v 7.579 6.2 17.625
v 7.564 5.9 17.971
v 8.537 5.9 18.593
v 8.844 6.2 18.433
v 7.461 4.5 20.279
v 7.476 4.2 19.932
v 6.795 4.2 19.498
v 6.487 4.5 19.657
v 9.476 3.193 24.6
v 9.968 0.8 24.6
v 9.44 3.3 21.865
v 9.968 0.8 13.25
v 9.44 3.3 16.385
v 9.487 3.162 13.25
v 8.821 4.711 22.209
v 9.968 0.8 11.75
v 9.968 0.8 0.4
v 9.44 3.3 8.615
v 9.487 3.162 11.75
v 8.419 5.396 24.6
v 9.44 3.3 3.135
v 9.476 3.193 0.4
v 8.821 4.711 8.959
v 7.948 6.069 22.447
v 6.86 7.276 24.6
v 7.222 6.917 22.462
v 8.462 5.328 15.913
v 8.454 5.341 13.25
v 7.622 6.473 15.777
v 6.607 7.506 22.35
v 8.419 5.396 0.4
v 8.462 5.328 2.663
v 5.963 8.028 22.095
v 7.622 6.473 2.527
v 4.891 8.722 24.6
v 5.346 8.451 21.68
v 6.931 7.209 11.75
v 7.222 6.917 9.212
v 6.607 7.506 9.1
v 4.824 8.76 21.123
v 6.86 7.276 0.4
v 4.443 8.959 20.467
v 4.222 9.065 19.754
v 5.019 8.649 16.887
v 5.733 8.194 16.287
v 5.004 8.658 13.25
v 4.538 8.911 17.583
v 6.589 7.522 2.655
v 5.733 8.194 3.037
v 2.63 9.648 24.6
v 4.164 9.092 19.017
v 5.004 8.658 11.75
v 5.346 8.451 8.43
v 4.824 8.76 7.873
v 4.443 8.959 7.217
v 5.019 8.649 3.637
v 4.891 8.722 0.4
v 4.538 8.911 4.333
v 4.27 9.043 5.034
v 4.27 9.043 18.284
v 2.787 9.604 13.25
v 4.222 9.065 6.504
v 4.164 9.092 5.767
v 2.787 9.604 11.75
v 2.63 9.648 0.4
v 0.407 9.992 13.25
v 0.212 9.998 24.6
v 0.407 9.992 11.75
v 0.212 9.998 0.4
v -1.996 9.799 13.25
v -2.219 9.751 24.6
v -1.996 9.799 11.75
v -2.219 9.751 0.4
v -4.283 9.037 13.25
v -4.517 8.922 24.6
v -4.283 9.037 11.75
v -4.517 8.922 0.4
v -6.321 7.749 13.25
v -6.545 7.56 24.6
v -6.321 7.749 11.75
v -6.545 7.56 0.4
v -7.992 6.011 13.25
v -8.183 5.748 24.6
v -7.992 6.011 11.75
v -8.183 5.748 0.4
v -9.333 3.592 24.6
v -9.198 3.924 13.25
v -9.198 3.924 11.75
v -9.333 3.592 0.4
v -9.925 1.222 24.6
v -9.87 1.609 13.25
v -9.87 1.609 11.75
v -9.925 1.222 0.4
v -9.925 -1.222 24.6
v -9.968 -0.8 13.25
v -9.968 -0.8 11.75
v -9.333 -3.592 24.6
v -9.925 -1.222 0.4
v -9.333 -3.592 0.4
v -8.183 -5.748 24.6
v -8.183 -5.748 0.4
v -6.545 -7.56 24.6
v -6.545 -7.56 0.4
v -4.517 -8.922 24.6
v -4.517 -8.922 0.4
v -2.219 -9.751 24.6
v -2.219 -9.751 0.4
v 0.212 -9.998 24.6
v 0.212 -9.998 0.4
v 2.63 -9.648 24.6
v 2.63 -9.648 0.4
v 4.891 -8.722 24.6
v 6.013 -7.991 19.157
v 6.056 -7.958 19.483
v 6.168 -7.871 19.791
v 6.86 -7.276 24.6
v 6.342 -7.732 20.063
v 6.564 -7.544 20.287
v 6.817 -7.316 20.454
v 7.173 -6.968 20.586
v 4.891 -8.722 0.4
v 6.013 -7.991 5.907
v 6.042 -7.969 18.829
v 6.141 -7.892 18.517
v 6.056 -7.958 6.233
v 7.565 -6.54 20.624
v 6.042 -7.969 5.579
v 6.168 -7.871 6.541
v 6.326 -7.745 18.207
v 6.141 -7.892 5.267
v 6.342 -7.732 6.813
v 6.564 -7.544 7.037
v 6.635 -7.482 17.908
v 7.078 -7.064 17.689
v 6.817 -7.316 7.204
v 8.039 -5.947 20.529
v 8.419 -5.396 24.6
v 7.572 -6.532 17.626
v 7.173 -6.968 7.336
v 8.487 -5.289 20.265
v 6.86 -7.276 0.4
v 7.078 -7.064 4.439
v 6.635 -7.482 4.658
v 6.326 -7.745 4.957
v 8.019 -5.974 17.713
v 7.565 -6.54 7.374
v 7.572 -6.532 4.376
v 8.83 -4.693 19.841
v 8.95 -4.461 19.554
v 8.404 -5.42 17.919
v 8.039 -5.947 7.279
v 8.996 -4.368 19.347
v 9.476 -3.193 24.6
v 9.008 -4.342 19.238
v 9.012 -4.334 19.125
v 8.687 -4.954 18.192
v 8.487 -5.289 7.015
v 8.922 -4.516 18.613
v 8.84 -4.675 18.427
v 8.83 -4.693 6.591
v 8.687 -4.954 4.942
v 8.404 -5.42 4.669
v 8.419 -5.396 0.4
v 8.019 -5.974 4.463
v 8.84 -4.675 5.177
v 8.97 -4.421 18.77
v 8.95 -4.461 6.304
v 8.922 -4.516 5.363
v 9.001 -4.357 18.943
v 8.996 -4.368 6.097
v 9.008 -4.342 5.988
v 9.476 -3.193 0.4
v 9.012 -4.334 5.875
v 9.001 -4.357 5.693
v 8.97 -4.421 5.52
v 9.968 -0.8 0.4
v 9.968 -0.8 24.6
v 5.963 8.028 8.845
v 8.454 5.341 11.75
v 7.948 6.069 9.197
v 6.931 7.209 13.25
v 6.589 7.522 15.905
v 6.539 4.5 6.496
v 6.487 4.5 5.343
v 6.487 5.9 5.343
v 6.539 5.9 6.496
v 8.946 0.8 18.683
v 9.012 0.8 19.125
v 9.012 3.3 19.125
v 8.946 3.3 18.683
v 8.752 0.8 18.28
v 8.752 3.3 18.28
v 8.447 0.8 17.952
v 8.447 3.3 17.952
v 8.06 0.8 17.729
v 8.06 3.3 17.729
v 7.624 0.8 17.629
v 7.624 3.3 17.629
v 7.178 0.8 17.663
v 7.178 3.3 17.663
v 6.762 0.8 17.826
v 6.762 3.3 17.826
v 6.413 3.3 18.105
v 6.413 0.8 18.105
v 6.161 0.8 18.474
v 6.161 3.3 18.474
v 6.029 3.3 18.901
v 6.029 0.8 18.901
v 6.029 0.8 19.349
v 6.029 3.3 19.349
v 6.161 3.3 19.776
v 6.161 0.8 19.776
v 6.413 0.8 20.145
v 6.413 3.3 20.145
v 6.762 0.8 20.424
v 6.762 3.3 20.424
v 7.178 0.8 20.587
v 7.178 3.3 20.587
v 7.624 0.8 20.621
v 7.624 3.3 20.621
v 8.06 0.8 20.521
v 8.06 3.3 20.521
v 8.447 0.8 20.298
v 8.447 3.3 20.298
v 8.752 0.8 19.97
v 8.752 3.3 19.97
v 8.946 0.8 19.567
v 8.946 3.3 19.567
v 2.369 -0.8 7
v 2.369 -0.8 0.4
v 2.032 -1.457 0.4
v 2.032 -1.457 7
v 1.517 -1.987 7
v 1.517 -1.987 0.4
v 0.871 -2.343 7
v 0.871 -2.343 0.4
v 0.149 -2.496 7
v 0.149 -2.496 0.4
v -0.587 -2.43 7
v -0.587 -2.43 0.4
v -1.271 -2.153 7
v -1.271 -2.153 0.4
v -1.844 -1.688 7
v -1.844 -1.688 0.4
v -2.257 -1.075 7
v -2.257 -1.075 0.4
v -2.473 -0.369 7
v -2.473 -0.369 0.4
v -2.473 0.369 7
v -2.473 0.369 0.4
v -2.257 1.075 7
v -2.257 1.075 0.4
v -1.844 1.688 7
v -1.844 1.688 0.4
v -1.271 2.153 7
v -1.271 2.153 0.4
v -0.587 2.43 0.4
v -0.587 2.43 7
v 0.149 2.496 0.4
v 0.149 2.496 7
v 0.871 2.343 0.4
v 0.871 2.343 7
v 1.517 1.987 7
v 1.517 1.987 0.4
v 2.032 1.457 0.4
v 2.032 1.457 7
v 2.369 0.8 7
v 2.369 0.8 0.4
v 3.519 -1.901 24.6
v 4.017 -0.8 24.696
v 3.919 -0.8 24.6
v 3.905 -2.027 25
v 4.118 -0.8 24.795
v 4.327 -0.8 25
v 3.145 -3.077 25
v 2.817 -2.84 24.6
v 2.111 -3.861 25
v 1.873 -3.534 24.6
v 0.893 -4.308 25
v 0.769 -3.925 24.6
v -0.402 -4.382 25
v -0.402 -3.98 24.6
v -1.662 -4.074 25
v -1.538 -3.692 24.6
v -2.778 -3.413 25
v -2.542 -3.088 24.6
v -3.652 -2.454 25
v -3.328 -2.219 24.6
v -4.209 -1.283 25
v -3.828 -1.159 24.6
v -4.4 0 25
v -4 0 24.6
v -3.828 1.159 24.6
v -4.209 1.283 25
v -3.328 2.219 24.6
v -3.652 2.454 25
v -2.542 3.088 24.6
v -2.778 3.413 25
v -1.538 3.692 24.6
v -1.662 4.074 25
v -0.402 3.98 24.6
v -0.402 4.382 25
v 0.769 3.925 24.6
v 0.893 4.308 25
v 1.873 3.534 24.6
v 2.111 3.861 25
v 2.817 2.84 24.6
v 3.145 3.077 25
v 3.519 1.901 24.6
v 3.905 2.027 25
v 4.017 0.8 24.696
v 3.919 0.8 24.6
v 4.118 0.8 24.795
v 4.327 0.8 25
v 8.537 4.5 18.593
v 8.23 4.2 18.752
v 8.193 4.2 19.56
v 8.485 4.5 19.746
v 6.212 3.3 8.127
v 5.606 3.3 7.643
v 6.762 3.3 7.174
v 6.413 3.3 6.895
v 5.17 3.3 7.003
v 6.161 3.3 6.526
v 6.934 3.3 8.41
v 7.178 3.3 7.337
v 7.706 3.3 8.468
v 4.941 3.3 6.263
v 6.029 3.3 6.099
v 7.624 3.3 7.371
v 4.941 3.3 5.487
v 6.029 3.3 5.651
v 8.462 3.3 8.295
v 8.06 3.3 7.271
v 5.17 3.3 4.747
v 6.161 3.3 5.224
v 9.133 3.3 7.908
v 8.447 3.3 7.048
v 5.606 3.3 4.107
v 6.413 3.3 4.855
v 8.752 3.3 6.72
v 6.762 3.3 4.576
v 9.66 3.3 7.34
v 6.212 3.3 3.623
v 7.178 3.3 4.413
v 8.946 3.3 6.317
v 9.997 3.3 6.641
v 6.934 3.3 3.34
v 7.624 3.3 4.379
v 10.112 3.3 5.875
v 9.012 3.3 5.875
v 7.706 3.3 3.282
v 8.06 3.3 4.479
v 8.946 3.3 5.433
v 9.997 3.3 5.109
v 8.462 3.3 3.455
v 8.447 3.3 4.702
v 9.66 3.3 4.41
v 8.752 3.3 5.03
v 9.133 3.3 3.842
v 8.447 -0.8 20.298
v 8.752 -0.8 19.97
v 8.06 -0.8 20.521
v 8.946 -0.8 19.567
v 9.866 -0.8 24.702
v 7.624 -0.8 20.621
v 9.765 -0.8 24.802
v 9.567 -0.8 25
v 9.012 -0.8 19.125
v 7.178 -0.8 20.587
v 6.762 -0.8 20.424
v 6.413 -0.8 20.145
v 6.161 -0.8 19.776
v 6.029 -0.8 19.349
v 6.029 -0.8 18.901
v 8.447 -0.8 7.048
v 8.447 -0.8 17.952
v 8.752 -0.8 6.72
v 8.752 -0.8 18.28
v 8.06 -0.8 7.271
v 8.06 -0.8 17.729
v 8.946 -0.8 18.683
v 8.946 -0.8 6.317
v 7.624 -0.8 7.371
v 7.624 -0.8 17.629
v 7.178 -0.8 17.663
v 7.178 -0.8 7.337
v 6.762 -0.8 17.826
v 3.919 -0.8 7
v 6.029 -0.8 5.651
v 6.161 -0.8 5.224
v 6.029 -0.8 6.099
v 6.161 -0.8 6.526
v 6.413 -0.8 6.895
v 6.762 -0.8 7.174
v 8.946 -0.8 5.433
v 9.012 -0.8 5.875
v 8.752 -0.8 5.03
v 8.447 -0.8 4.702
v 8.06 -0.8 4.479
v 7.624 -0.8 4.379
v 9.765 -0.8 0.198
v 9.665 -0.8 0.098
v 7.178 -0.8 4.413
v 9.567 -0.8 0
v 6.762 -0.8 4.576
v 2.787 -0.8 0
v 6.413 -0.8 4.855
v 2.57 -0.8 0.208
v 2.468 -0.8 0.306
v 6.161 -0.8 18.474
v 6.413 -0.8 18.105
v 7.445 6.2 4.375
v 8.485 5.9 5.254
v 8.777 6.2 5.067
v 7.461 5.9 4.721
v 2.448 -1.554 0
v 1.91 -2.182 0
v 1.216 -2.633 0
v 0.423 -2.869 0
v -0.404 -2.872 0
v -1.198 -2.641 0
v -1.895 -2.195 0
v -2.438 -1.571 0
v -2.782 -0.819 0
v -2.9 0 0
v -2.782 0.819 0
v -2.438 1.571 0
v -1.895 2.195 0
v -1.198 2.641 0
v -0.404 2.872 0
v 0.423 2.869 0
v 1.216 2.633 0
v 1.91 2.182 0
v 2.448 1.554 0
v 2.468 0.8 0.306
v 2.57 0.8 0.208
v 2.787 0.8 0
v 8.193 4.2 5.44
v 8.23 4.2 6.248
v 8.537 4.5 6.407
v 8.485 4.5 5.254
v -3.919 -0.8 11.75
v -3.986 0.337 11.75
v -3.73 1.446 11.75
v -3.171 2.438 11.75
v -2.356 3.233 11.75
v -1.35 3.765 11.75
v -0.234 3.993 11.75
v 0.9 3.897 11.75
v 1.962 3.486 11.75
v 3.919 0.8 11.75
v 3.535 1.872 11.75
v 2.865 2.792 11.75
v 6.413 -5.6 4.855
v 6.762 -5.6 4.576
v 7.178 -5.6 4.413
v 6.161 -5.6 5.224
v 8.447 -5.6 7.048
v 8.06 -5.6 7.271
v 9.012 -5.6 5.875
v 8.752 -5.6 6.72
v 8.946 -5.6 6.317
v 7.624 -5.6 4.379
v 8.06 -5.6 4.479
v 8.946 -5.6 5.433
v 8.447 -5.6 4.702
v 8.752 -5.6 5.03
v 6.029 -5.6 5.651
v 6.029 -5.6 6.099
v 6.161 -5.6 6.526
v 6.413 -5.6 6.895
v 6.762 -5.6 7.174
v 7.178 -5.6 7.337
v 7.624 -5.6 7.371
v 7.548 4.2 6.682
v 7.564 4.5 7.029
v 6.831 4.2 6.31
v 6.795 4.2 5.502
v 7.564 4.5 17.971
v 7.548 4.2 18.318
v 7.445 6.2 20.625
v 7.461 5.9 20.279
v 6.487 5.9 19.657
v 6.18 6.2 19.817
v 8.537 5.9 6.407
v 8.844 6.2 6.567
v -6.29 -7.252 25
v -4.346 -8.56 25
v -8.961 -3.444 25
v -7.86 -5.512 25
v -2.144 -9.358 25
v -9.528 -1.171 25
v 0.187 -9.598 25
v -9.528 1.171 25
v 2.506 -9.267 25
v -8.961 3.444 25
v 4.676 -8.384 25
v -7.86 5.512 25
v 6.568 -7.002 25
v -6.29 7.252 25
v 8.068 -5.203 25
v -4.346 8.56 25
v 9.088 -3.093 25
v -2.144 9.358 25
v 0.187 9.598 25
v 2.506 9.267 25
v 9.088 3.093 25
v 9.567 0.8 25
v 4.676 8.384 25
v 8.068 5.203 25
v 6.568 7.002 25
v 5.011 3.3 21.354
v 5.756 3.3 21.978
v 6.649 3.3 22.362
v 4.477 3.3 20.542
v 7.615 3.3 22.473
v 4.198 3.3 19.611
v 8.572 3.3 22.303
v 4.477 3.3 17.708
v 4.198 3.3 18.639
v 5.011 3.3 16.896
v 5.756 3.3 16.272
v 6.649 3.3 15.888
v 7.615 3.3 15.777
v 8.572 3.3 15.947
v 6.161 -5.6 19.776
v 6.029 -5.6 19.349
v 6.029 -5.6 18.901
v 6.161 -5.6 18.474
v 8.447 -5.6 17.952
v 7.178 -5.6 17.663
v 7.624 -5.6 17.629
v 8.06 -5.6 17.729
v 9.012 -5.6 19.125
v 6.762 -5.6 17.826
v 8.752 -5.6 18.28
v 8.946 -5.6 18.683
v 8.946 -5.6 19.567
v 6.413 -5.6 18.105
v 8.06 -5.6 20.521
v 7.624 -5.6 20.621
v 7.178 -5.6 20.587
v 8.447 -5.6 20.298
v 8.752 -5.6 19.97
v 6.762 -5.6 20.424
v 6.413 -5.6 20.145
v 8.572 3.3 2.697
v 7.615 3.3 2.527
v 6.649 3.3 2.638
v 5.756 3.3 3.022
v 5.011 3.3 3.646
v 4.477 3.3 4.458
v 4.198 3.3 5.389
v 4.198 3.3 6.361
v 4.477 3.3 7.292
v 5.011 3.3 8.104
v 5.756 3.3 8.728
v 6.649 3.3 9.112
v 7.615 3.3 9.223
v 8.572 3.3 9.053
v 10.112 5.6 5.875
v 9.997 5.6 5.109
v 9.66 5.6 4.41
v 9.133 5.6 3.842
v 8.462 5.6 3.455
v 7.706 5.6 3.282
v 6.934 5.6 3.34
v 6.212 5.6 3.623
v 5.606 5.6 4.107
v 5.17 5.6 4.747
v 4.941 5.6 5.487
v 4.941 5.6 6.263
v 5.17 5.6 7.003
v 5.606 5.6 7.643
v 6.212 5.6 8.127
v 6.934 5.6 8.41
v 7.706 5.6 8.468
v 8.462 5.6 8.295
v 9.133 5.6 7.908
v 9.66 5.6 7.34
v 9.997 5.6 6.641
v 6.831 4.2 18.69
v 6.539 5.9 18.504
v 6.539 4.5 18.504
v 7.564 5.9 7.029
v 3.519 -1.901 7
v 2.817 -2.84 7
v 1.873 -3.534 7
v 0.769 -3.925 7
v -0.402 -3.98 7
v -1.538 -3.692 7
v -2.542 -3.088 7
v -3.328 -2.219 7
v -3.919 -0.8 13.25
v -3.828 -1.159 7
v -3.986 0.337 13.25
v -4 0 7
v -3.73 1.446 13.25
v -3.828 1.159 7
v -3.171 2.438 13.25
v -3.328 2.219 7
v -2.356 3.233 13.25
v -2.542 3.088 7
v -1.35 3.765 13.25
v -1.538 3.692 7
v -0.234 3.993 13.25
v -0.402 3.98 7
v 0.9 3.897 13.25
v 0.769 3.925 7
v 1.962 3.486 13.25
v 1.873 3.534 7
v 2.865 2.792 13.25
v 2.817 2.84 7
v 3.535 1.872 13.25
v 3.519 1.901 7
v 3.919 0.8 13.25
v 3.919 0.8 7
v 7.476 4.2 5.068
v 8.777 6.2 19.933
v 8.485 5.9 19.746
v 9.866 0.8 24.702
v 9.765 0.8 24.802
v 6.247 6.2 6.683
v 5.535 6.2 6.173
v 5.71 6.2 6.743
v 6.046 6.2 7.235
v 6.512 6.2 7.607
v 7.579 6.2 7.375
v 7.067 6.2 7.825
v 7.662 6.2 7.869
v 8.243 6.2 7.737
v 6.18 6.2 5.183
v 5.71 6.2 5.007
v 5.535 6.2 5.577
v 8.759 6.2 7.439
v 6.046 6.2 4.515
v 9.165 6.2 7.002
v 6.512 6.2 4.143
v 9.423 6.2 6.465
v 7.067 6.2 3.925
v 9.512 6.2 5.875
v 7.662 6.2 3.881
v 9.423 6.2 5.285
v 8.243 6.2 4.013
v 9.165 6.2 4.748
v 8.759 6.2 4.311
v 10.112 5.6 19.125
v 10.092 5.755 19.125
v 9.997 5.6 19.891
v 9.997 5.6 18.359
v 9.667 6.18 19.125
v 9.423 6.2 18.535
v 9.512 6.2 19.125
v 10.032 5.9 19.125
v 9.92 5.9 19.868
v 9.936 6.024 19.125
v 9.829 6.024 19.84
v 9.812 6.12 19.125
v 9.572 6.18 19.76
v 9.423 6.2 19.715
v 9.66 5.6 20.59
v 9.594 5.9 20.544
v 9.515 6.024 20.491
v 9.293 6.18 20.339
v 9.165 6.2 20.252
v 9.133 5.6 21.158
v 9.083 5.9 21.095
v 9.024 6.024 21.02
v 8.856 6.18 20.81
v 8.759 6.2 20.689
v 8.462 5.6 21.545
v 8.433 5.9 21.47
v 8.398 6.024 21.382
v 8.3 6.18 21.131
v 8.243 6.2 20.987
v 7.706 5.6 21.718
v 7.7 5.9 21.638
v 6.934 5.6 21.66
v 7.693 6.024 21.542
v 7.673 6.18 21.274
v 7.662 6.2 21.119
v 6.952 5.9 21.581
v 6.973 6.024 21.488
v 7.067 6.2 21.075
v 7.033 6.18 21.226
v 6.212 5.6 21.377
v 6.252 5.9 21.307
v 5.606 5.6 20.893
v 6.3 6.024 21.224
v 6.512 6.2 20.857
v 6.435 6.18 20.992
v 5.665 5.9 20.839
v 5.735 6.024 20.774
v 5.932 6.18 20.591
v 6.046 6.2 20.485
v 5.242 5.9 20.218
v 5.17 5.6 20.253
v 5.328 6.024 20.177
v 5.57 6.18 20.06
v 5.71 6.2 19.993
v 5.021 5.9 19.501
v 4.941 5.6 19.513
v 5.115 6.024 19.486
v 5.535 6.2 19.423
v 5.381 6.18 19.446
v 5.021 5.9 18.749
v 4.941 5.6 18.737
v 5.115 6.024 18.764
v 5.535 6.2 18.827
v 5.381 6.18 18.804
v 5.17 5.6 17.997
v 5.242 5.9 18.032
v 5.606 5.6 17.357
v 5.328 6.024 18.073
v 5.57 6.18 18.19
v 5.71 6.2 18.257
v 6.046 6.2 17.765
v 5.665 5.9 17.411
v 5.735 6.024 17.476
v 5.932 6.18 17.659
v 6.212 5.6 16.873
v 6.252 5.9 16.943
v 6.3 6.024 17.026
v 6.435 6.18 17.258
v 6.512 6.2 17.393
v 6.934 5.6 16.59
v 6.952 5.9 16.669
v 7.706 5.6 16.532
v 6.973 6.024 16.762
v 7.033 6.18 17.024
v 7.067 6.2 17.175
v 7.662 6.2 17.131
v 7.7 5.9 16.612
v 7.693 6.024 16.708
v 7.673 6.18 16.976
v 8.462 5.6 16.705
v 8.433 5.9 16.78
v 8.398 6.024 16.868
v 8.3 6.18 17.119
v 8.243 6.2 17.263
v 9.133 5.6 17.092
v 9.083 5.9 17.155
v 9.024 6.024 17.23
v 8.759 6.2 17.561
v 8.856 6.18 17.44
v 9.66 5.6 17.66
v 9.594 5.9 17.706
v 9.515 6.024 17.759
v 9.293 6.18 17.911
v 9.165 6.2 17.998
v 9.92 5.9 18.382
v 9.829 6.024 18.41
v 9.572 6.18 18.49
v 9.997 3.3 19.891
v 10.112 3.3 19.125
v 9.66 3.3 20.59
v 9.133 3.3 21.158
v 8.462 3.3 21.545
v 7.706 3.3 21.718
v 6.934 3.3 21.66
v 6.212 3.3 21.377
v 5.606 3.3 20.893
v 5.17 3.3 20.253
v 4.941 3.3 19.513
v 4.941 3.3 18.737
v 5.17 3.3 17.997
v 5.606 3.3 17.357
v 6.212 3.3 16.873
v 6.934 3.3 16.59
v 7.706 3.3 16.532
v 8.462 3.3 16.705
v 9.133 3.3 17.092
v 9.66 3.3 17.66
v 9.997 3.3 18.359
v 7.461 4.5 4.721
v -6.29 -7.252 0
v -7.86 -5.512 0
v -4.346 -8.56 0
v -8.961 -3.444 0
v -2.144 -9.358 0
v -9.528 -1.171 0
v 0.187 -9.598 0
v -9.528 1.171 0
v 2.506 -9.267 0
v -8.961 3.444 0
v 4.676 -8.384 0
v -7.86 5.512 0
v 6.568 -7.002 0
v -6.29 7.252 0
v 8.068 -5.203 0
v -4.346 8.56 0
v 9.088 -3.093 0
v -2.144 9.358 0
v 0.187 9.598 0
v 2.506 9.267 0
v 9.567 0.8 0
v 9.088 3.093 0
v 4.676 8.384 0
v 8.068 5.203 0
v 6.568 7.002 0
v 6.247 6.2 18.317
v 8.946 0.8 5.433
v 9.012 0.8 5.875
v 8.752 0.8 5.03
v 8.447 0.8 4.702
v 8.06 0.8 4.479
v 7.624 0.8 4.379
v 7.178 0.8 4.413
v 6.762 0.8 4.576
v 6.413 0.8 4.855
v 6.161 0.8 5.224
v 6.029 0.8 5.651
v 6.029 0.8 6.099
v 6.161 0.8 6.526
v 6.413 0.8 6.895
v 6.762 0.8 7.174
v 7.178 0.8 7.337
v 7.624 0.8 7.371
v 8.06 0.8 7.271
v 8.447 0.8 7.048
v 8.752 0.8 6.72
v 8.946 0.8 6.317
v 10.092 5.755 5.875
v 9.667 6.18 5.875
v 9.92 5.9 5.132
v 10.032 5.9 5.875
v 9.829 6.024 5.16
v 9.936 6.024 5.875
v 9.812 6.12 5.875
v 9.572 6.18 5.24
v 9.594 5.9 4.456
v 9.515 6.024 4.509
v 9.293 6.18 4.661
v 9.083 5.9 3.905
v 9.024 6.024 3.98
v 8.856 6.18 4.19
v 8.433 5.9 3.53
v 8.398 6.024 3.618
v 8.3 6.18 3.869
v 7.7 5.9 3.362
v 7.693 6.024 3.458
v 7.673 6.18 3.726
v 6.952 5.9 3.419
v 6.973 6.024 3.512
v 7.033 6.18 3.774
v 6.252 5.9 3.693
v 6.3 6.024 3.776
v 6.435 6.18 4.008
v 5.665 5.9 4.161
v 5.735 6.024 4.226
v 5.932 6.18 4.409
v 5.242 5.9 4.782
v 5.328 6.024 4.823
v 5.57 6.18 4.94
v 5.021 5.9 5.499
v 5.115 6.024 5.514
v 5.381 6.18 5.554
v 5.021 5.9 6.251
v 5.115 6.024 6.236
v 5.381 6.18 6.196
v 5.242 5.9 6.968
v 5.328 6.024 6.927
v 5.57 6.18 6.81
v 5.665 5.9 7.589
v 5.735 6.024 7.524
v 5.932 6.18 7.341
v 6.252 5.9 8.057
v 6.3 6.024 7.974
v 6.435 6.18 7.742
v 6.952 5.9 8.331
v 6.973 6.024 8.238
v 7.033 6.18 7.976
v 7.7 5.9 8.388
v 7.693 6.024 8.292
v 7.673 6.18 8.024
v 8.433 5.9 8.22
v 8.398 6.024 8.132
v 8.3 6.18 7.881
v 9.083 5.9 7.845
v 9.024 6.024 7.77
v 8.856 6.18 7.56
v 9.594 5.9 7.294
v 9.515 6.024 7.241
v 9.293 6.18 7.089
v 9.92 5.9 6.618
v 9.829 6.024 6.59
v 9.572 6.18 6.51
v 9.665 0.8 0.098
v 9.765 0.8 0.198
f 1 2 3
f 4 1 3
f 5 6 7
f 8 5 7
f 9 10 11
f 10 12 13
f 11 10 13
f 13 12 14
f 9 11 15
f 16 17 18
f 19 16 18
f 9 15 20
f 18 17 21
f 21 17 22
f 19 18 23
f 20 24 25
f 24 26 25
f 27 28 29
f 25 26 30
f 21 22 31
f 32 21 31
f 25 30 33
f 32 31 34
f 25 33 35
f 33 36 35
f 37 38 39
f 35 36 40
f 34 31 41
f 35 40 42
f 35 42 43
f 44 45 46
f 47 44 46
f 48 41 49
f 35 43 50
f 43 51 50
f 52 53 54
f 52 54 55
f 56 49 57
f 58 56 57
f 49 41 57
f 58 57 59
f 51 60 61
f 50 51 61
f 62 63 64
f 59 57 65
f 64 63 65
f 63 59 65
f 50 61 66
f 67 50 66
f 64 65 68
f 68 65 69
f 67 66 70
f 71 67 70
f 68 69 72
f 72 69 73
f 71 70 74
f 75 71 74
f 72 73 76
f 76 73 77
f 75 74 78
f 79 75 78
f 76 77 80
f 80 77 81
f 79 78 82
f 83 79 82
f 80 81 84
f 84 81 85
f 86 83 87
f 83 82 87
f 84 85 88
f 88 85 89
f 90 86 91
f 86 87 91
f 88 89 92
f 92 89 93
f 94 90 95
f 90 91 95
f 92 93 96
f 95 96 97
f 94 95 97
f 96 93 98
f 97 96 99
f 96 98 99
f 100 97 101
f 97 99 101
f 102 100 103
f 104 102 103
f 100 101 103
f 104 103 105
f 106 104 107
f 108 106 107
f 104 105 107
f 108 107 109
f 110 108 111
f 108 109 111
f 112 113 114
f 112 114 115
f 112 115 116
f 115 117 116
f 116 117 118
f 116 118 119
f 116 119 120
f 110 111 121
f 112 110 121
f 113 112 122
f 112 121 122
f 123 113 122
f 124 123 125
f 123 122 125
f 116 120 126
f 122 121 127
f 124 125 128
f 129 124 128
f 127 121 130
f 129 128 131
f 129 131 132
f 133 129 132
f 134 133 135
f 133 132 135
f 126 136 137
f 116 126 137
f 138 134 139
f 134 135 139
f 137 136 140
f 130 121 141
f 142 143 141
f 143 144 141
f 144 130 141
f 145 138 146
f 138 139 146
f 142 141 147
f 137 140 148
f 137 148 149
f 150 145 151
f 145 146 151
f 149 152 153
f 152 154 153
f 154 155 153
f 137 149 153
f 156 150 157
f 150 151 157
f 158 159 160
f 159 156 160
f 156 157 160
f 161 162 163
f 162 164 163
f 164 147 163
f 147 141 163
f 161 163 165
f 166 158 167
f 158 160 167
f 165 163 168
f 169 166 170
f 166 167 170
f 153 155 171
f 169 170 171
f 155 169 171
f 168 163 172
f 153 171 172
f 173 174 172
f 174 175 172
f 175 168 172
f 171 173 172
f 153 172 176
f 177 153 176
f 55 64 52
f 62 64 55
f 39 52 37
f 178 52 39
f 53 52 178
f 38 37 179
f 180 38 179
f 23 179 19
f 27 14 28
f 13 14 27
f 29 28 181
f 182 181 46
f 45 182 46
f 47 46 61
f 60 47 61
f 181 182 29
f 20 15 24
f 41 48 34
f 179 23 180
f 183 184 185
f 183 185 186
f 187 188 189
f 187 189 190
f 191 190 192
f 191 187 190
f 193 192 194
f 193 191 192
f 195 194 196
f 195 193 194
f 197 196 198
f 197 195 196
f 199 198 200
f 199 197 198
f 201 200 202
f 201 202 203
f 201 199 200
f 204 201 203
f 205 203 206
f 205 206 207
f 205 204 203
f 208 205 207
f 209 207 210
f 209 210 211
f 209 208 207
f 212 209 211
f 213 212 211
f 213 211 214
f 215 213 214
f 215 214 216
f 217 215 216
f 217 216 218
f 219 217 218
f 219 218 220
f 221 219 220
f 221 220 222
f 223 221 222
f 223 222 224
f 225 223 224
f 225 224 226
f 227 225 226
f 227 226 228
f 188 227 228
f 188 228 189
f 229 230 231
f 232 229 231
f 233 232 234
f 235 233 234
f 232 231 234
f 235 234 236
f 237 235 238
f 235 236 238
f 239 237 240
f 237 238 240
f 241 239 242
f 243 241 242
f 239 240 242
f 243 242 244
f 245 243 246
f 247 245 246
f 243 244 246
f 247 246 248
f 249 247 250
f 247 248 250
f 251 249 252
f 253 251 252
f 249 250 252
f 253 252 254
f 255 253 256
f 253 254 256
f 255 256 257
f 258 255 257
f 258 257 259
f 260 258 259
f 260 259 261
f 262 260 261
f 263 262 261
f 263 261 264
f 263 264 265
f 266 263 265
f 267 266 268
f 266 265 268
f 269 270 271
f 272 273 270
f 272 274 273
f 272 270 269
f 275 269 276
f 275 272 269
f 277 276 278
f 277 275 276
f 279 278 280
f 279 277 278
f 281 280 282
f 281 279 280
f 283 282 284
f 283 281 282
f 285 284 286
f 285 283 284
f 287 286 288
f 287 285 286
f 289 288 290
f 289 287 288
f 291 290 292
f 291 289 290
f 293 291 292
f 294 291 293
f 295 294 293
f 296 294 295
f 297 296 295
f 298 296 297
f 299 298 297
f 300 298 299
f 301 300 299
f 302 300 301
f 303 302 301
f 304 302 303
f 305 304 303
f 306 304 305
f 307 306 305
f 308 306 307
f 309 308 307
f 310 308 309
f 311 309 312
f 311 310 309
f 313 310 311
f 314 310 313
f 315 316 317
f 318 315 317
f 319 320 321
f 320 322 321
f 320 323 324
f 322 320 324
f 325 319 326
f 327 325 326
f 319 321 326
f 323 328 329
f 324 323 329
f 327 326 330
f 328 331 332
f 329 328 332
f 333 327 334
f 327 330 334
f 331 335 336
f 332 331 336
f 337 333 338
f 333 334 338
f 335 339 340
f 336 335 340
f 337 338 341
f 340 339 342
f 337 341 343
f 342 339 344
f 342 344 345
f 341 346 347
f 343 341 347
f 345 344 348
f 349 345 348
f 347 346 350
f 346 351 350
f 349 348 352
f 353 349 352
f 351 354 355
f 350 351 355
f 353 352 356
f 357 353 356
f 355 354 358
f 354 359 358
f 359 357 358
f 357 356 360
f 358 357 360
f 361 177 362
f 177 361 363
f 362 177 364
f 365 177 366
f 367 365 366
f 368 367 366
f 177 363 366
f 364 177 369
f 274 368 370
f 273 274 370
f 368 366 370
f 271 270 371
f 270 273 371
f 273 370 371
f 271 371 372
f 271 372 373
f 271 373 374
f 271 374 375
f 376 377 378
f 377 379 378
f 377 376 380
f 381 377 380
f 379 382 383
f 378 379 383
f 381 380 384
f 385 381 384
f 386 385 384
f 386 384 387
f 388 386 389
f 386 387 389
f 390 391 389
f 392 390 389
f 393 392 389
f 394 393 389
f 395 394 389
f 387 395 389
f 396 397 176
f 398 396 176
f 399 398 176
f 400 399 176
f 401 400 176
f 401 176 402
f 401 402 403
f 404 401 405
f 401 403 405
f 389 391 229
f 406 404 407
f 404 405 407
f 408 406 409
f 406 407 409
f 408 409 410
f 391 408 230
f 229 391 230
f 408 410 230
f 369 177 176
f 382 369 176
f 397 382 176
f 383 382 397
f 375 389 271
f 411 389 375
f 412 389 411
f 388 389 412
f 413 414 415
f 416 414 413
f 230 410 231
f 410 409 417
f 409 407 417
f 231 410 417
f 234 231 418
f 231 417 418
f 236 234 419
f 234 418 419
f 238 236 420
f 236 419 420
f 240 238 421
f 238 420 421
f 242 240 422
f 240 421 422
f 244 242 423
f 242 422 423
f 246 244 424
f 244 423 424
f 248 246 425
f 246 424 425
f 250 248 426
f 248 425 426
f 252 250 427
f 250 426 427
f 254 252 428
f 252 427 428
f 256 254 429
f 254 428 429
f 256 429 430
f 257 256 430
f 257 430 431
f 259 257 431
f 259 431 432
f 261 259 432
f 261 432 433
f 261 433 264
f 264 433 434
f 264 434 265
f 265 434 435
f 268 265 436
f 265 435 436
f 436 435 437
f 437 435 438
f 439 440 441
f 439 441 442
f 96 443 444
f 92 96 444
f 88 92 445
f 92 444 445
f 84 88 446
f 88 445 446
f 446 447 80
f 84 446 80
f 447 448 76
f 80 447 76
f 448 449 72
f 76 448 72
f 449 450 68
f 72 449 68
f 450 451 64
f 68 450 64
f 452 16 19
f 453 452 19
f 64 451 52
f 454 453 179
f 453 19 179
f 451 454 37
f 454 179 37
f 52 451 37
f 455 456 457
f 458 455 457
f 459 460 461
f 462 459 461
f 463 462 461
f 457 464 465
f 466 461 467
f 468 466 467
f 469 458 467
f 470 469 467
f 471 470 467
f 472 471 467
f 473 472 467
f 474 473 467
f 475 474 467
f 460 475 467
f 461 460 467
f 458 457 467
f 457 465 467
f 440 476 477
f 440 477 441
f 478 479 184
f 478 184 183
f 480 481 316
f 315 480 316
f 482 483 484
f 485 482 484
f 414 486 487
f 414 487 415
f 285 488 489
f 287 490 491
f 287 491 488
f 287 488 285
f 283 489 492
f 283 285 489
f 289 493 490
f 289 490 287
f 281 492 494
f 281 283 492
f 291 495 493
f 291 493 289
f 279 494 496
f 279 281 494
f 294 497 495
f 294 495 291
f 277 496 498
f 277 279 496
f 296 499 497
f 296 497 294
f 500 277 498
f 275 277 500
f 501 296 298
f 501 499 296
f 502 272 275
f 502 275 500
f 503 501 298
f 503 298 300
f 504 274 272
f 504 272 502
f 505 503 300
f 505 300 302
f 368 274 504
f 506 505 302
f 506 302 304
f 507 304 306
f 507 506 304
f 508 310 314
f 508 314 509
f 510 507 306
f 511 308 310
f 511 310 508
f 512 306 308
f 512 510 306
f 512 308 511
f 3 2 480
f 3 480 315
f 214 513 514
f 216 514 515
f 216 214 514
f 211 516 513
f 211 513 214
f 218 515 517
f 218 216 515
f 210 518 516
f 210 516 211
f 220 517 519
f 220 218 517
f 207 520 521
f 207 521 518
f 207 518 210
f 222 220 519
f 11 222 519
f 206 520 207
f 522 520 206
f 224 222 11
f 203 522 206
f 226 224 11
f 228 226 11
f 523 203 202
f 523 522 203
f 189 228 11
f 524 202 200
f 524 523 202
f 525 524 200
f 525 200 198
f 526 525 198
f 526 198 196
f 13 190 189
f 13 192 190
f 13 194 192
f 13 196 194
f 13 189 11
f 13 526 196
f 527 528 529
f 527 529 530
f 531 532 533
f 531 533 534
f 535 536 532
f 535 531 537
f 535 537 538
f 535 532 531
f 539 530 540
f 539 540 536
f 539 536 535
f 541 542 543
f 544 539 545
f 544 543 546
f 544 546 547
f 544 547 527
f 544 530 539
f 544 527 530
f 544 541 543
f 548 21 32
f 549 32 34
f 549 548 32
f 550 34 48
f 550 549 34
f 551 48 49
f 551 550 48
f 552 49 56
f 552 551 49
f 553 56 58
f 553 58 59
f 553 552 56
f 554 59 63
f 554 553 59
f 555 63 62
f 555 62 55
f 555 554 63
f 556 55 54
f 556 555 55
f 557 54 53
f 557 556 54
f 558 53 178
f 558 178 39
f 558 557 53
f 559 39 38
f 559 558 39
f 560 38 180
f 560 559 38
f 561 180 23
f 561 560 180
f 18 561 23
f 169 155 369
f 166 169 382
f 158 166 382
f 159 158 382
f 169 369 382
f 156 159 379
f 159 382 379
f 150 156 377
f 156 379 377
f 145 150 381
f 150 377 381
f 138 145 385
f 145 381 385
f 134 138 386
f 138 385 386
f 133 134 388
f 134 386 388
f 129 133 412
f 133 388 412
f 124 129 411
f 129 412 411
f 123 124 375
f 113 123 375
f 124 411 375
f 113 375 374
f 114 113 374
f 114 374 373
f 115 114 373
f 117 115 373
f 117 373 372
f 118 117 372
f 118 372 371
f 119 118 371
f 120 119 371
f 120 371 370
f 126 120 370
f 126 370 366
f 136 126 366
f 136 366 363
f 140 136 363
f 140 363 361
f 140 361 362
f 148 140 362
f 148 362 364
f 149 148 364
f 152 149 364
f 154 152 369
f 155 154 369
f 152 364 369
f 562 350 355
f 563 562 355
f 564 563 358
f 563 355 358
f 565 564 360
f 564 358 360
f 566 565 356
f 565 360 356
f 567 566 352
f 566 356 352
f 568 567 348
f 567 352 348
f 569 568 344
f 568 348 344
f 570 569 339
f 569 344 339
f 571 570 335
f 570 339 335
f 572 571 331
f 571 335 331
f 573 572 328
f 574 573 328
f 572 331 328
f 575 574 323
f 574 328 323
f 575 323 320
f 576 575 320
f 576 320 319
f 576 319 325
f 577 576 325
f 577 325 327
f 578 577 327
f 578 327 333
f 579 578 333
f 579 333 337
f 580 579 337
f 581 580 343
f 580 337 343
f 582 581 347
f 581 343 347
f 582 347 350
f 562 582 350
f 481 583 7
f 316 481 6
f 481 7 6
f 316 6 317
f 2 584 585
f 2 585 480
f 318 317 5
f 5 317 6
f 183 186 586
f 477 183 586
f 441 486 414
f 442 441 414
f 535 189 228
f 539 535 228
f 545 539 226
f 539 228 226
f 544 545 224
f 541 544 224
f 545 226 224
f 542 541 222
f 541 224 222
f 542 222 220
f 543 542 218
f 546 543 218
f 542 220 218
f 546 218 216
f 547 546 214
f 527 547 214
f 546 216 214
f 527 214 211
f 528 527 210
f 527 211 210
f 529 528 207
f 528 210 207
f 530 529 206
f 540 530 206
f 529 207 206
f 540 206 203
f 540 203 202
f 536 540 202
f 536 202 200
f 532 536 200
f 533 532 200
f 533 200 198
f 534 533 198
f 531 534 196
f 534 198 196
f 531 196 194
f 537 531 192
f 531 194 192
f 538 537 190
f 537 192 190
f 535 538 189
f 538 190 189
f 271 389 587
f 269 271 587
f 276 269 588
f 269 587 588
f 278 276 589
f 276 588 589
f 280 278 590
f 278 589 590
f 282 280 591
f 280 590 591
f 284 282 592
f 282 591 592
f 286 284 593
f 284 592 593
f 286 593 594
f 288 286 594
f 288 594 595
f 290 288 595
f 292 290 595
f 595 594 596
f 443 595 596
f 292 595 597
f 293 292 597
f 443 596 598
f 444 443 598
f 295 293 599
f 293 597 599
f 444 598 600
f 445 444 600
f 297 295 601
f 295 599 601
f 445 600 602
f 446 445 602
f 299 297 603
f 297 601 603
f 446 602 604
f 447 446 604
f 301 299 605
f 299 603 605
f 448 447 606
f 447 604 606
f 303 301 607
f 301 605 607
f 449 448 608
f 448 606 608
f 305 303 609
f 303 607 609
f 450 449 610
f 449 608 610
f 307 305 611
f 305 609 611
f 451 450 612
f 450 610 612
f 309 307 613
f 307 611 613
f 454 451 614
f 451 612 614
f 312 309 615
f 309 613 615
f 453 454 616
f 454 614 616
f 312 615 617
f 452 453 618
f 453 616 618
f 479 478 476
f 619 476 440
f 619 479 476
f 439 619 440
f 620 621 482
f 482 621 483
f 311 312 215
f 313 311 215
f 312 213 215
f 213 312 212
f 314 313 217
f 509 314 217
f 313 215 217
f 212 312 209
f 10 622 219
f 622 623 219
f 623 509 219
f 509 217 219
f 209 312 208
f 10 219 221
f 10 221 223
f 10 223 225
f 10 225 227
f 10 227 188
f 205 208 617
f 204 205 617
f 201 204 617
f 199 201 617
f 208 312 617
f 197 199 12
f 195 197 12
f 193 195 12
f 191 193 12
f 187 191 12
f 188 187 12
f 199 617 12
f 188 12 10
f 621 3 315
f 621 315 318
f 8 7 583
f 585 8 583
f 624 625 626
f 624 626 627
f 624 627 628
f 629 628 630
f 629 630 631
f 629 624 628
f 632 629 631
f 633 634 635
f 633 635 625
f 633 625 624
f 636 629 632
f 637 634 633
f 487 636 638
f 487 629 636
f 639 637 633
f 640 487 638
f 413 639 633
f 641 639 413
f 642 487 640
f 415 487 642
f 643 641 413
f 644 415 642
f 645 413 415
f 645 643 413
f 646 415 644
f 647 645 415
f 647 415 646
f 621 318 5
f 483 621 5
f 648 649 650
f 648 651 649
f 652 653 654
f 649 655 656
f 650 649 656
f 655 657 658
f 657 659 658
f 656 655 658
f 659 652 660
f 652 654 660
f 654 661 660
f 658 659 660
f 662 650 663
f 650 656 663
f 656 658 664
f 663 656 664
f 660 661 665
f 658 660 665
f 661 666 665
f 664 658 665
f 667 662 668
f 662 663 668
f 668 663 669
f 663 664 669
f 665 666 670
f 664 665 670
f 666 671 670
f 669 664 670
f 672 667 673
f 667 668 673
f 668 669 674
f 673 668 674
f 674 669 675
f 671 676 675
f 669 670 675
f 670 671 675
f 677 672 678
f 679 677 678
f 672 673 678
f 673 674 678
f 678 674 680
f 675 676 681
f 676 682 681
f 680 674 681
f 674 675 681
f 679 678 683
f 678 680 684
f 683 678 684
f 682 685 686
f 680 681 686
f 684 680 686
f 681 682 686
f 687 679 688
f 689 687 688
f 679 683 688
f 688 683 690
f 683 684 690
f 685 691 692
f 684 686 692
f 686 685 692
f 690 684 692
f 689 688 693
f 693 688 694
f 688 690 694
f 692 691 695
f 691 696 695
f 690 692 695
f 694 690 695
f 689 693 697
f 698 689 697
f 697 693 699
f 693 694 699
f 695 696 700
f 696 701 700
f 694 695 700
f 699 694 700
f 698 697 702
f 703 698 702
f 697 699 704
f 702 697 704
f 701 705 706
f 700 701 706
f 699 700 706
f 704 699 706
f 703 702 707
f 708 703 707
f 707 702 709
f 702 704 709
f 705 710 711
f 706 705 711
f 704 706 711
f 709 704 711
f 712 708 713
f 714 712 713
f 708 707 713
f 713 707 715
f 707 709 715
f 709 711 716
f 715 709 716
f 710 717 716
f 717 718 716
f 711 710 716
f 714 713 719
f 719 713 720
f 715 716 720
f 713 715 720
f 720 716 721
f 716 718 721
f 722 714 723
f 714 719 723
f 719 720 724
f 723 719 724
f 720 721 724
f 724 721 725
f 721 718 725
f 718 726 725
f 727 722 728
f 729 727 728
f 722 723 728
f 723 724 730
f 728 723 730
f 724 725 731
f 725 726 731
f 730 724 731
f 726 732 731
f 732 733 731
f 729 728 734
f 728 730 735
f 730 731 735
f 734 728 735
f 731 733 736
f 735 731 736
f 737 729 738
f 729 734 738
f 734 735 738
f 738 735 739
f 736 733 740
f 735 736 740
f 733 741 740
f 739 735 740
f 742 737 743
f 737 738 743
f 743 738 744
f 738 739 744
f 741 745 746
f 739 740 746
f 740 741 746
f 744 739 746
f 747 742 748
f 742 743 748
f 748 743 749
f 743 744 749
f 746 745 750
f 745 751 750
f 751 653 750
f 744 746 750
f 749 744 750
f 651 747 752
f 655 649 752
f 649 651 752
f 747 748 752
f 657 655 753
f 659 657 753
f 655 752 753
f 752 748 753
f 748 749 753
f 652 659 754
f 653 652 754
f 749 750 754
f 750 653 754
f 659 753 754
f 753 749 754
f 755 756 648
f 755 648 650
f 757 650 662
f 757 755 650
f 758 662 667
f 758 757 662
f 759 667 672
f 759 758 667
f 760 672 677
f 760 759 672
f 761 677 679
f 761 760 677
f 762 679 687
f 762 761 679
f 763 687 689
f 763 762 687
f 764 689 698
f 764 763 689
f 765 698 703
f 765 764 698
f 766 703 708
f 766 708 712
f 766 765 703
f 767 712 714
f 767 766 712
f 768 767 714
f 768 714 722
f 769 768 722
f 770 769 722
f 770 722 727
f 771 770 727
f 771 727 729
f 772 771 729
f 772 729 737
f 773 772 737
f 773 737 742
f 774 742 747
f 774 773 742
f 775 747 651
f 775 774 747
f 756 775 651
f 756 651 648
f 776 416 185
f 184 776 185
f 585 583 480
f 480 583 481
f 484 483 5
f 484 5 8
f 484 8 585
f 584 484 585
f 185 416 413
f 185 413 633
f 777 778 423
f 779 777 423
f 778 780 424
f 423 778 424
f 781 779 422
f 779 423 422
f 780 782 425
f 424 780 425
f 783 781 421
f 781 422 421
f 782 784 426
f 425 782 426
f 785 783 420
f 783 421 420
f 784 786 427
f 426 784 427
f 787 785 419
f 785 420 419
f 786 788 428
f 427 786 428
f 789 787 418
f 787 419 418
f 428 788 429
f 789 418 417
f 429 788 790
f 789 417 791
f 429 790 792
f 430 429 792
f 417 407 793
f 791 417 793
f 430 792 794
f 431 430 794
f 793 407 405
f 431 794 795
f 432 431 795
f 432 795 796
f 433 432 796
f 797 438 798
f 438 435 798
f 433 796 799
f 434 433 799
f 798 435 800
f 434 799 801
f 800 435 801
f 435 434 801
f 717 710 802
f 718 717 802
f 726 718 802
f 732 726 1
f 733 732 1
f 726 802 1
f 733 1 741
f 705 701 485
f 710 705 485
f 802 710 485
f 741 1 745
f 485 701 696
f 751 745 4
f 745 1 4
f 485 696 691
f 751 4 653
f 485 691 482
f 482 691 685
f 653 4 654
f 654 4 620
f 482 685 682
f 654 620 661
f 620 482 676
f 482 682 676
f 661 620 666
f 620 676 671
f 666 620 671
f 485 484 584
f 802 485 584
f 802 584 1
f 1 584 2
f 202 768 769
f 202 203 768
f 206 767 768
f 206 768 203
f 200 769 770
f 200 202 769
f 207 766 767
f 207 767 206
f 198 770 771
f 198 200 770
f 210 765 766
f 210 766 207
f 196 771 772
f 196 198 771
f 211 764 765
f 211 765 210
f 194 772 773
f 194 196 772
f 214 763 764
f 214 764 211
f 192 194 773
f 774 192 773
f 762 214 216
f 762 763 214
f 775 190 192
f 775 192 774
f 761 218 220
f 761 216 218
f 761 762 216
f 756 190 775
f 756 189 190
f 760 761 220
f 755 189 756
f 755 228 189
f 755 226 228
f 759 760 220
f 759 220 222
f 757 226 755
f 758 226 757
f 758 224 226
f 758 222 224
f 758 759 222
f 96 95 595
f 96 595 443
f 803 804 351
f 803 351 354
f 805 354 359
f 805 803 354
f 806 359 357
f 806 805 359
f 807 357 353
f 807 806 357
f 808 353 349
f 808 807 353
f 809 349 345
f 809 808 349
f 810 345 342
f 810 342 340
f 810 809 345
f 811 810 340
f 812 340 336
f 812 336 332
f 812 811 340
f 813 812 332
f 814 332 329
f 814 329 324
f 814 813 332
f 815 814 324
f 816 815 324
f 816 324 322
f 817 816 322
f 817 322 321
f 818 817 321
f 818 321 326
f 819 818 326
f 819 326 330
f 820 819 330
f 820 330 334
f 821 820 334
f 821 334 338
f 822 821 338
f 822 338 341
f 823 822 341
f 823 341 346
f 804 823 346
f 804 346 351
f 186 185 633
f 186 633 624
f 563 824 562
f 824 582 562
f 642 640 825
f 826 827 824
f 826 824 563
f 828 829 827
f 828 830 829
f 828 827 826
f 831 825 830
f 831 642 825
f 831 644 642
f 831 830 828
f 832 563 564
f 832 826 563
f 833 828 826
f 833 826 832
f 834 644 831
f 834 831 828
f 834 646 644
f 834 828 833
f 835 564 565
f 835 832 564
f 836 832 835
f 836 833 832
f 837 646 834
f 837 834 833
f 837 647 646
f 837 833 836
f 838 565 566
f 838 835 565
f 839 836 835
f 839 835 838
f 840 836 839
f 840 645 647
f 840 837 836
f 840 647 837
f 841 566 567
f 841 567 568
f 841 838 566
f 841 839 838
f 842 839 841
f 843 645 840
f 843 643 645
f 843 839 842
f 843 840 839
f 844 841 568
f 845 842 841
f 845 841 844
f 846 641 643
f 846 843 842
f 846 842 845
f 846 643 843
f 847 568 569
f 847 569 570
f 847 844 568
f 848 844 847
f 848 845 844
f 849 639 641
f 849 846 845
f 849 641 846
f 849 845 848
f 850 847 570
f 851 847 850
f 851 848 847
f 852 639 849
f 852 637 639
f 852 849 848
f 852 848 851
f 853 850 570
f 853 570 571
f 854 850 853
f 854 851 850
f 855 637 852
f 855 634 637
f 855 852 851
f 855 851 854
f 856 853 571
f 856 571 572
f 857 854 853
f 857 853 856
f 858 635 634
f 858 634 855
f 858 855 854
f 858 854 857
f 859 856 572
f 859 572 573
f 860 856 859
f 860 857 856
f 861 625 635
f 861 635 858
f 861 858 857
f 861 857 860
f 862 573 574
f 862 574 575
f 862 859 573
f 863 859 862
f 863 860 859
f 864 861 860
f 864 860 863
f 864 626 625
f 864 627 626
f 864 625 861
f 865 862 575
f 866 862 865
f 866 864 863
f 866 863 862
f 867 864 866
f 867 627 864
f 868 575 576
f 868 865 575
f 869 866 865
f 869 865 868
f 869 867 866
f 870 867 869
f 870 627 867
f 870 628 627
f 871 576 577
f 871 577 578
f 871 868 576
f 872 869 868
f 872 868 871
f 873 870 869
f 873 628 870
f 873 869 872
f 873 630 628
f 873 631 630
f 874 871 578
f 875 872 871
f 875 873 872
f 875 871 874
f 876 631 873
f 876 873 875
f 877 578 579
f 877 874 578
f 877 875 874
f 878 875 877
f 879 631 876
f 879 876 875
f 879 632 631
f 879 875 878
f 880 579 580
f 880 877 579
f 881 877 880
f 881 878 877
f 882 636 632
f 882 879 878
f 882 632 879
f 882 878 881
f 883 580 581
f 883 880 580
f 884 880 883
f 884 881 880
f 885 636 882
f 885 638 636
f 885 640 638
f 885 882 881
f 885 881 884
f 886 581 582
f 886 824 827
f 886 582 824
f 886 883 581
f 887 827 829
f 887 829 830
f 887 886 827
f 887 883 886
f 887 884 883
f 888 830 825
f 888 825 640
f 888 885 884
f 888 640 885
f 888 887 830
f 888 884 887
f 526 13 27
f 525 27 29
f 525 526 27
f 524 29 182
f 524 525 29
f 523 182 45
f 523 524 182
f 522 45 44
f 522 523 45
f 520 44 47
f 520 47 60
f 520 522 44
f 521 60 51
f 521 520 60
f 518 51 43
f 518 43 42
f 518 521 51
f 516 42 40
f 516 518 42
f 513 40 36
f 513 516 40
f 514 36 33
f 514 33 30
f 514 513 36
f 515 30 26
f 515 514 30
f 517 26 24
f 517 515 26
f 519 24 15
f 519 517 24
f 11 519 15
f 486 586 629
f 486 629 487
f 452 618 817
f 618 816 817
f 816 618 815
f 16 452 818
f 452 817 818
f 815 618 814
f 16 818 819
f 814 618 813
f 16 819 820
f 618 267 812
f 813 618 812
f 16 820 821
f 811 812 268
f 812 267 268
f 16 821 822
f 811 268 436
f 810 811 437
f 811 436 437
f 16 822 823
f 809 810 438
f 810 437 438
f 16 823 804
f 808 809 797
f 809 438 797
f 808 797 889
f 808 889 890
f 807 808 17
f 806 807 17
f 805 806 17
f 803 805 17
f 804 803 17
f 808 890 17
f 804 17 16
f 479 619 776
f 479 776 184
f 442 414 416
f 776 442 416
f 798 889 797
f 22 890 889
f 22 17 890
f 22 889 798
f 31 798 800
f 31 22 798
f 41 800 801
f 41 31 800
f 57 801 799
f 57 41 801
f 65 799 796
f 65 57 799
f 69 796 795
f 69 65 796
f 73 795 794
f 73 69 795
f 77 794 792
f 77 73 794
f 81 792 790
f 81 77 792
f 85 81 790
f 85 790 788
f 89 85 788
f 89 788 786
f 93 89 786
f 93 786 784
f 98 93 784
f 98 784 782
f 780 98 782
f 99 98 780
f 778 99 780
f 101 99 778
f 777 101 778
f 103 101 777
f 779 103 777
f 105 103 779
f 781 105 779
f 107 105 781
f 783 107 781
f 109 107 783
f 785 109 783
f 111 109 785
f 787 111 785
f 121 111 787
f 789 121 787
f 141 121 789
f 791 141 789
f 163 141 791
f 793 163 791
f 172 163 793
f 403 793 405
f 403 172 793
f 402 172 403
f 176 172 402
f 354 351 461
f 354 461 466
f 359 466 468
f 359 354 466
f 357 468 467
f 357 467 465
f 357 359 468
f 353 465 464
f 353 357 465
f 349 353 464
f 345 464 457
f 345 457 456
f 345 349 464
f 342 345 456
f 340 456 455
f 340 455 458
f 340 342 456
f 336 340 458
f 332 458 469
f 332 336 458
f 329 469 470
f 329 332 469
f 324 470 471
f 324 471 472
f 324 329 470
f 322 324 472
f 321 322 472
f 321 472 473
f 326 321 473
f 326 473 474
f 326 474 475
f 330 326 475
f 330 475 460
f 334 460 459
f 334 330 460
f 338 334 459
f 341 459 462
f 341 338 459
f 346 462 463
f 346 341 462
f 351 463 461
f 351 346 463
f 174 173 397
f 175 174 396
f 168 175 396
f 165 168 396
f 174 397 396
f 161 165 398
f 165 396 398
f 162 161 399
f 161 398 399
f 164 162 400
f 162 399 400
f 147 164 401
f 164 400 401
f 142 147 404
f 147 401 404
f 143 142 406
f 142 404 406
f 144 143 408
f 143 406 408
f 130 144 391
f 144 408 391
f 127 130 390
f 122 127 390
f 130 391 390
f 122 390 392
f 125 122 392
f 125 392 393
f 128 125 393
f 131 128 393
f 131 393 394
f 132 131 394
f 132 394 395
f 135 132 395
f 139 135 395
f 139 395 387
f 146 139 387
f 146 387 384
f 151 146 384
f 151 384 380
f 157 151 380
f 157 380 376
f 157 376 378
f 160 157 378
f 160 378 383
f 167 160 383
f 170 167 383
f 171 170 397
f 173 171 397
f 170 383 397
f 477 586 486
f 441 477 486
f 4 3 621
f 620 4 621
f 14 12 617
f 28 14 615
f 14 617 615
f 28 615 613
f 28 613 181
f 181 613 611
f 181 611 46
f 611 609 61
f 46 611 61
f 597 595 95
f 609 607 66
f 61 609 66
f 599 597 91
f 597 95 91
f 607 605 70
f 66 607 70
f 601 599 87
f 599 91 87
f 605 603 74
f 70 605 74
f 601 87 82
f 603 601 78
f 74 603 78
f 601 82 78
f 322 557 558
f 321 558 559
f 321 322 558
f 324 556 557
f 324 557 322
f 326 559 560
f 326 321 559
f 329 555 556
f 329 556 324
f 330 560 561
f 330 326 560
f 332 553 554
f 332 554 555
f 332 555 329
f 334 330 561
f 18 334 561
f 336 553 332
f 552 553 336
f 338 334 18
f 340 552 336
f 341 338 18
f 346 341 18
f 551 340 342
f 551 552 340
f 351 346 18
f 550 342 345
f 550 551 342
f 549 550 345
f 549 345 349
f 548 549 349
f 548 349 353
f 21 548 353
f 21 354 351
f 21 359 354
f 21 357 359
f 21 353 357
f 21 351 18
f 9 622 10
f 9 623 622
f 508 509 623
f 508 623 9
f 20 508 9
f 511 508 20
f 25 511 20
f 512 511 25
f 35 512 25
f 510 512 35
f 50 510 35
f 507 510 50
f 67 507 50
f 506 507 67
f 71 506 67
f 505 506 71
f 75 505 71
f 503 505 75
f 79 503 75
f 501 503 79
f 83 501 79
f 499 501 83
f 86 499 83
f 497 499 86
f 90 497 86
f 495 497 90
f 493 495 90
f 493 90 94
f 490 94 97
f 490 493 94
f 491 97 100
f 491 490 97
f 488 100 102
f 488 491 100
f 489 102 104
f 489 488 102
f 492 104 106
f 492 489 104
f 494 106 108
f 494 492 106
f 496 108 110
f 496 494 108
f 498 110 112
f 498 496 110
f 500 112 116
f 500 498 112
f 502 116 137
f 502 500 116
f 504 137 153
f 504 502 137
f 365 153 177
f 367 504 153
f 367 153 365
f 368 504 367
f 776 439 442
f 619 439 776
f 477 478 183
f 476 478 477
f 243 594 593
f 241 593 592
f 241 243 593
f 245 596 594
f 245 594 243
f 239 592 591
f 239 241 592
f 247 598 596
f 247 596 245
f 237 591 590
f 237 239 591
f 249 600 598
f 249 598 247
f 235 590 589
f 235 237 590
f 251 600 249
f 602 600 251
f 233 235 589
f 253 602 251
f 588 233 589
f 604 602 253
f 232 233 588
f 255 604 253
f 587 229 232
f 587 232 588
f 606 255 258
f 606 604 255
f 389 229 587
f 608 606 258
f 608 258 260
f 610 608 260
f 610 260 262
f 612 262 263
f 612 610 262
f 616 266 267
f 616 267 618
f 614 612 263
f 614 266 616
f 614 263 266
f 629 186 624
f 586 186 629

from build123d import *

# Parameters (mm, degrees)
EXTRUDE_1_DEPTH          = 25
EXTRUDE_2_DEPTH          = 7
SKETCH_2_W               = 1.5
SKETCH_2_H               = 14.459173422
CUT_EXTRUDE_1_DEPTH      = 10.967948636
CUT_EXTRUDE_1_DEPTH_BACK = 11
SKETCH_3_R               = 1.5
CUT_EXTRUDE_2_DEPTH      = 11
CUT_EXTRUDE_2_DEPTH_BACK = 11
CUT_EXTRUDE_START        = 3.3
SKETCH_3_3_R             = 3.35
SKETCH_3_3_R_2           = 1.5
CUT_EXTRUDE_3_DEPTH      = 7.7000001
CHAMFER_1_SIZE           = 0.4
SKETCH_4_R               = 2.6
EXTRUDE_3_DEPTH          = 2.9
SKETCH_4_3_R             = 1.5
EXTRUDE_4_DEPTH          = 8.9
CUT_EXTRUDE_4_DEPTH      = 2
FILLET_1_R               = 0.6
CHAMFER_2_SIZE           = 0.3


with BuildPart() as part:
    # Эскиз1 → Бобышка-Вытянуть1 (new body)
    with BuildSketch(Plane.XY):
        with BuildLine():
            Line((9.967948636, -0.8), (3.919183588, -0.8))
            ThreePointArc((3.919183588, -0.8), (-4, 0), (3.919183588, 0.8))
            Line((3.919183588, 0.8), (9.967948636, 0.8))
            ThreePointArc((9.967948636, 0.8), (-10, 0), (9.967948636, -0.8))
        make_face()
    extrude(amount=EXTRUDE_1_DEPTH)

    # Эскиз1<3> → Бобышка-Вытянуть2 (add)
    with BuildSketch(Plane.XY):
        with BuildLine():
            Line((3.919183588, -0.8), (2.368543856, -0.8))
            ThreePointArc((2.368543856, -0.8), (-2.5, 0), (2.368543856, 0.8))
            Line((2.368543856, 0.8), (3.919183588, 0.8))
            ThreePointArc((3.919183588, 0.8), (-4, 0), (3.919183588, -0.8))
        make_face()
    extrude(amount=EXTRUDE_2_DEPTH)

    # Эскиз2 → Вырез-Вытянуть1 (cut, two sides)
    with BuildSketch(Plane(origin=(0, 0, 0), x_dir=(0, 0, -1), z_dir=(1, 0, 0))) as cut_extrude_1_sk:
        with Locations((-12.5, 6.429586711)):
            Rectangle(SKETCH_2_W, SKETCH_2_H)
    extrude(amount=CUT_EXTRUDE_1_DEPTH, mode=Mode.SUBTRACT)
    extrude(cut_extrude_1_sk.sketch, amount=-CUT_EXTRUDE_1_DEPTH_BACK, mode=Mode.SUBTRACT)

    # Эскиз3 → Вырез-Вытянуть2 (cut, two sides)
    with BuildSketch(Plane(origin=(0, 0, 0), x_dir=(1, 0, 0), z_dir=(0, 1, 0))) as cut_extrude_2_sk:
        with Locations((7.512178364, -19.125)):
            Circle(SKETCH_3_R)
        with Locations((7.512178364, -5.875)):
            Circle(SKETCH_3_R)
    extrude(amount=CUT_EXTRUDE_2_DEPTH, mode=Mode.SUBTRACT)
    extrude(cut_extrude_2_sk.sketch, amount=-CUT_EXTRUDE_2_DEPTH_BACK, mode=Mode.SUBTRACT)

    # Эскиз3<3> → Вырез-Вытянуть3 (cut, through all)
    with BuildSketch(Plane(origin=(0, 0, 0), x_dir=(1, 0, 0), z_dir=(0, 1, 0)).offset(CUT_EXTRUDE_START)):
        with Locations((7.512178364, -19.125)):
            Circle(SKETCH_3_3_R)
        with Locations((7.512178364, -19.125)):
            Circle(SKETCH_3_3_R_2, mode=Mode.SUBTRACT)
        with Locations((7.512178364, -5.875)):
            Circle(SKETCH_3_3_R)
        with Locations((7.512178364, -5.875)):
            Circle(SKETCH_3_3_R_2, mode=Mode.SUBTRACT)
    extrude(amount=CUT_EXTRUDE_3_DEPTH, mode=Mode.SUBTRACT)

    # Фаска1
    chamfer_1_edges = [part.edges().sort_by_distance(p)[0] for p in [
        (-10, 0, 25),
        (-2.5, 0, 0),
        (-4, 0, 25),
        (-10, 0, 0),
    ]]
    chamfer(chamfer_1_edges, length=CHAMFER_1_SIZE)


with BuildPart() as body_2:
    # Эскиз4 → Бобышка-Вытянуть3 (new body)
    with BuildSketch(Plane(origin=(0, 3.3, 0), x_dir=(1, 0, 0), z_dir=(0, 1, 0))):
        with Locations((7.512178364, -5.875)):
            Circle(SKETCH_4_R)
    extrude(amount=EXTRUDE_3_DEPTH)

    # Эскиз4<3> → Бобышка-Вытянуть4 (add)
    with BuildSketch(Plane(origin=(0, 3.3, 0), x_dir=(1, 0, 0), z_dir=(0, 1, 0))):
        with Locations((7.512178364, -5.875)):
            Circle(SKETCH_4_3_R)
    extrude(amount=-EXTRUDE_4_DEPTH)

    # Эскиз5 → Вырез-Вытянуть4 (cut)
    with BuildSketch(Plane(origin=(0, 6.2, 0), x_dir=(1, 0, 0), z_dir=(0, 1, 0))):
        Polygon((8.485442672, -5.253638656), (7.460695809, -4.721447713), (6.487431501, -5.342809057), (6.538914056, -6.496361344), (7.563660919, -7.028552287), (8.536925227, -6.407190943), align=None)
    extrude(amount=-CUT_EXTRUDE_4_DEPTH, mode=Mode.SUBTRACT)

    # Скругление1
    fillet_1_edges = [body_2.edges().sort_by_distance(p)[0] for p in [
        (4.912178364, 6.2, 5.875),
    ]]
    fillet(fillet_1_edges, radius=FILLET_1_R)

    # Фаска2
    chamfer_2_edges = [body_2.edges().sort_by_distance(p)[0] for p in [
        (8.51118395, 4.2, 5.8304148),
        (8.050293073, 4.2, 6.717871615),
        (7.051287488, 4.2, 6.762456816),
        (6.513172779, 4.2, 5.9195852),
        (6.974063655, 4.2, 5.032128385),
        (7.973069241, 4.2, 4.987543184),
        (8.51118395, 6.2, 5.8304148),
        (7.973069241, 6.2, 4.987543184),
        (6.974063655, 6.2, 5.032128385),
        (6.513172779, 6.2, 5.9195852),
        (7.051287488, 6.2, 6.762456816),
        (8.050293073, 6.2, 6.717871615),
    ]]
    chamfer(chamfer_2_edges, length=CHAMFER_2_SIZE)


with BuildPart() as body_3:
    # Зеркальное отражение1: mirrored copy
    add(body_2.part.mirror(Plane.XY.offset(12.5)))


solid = Compound([part.part, body_2.part, body_3.part])
